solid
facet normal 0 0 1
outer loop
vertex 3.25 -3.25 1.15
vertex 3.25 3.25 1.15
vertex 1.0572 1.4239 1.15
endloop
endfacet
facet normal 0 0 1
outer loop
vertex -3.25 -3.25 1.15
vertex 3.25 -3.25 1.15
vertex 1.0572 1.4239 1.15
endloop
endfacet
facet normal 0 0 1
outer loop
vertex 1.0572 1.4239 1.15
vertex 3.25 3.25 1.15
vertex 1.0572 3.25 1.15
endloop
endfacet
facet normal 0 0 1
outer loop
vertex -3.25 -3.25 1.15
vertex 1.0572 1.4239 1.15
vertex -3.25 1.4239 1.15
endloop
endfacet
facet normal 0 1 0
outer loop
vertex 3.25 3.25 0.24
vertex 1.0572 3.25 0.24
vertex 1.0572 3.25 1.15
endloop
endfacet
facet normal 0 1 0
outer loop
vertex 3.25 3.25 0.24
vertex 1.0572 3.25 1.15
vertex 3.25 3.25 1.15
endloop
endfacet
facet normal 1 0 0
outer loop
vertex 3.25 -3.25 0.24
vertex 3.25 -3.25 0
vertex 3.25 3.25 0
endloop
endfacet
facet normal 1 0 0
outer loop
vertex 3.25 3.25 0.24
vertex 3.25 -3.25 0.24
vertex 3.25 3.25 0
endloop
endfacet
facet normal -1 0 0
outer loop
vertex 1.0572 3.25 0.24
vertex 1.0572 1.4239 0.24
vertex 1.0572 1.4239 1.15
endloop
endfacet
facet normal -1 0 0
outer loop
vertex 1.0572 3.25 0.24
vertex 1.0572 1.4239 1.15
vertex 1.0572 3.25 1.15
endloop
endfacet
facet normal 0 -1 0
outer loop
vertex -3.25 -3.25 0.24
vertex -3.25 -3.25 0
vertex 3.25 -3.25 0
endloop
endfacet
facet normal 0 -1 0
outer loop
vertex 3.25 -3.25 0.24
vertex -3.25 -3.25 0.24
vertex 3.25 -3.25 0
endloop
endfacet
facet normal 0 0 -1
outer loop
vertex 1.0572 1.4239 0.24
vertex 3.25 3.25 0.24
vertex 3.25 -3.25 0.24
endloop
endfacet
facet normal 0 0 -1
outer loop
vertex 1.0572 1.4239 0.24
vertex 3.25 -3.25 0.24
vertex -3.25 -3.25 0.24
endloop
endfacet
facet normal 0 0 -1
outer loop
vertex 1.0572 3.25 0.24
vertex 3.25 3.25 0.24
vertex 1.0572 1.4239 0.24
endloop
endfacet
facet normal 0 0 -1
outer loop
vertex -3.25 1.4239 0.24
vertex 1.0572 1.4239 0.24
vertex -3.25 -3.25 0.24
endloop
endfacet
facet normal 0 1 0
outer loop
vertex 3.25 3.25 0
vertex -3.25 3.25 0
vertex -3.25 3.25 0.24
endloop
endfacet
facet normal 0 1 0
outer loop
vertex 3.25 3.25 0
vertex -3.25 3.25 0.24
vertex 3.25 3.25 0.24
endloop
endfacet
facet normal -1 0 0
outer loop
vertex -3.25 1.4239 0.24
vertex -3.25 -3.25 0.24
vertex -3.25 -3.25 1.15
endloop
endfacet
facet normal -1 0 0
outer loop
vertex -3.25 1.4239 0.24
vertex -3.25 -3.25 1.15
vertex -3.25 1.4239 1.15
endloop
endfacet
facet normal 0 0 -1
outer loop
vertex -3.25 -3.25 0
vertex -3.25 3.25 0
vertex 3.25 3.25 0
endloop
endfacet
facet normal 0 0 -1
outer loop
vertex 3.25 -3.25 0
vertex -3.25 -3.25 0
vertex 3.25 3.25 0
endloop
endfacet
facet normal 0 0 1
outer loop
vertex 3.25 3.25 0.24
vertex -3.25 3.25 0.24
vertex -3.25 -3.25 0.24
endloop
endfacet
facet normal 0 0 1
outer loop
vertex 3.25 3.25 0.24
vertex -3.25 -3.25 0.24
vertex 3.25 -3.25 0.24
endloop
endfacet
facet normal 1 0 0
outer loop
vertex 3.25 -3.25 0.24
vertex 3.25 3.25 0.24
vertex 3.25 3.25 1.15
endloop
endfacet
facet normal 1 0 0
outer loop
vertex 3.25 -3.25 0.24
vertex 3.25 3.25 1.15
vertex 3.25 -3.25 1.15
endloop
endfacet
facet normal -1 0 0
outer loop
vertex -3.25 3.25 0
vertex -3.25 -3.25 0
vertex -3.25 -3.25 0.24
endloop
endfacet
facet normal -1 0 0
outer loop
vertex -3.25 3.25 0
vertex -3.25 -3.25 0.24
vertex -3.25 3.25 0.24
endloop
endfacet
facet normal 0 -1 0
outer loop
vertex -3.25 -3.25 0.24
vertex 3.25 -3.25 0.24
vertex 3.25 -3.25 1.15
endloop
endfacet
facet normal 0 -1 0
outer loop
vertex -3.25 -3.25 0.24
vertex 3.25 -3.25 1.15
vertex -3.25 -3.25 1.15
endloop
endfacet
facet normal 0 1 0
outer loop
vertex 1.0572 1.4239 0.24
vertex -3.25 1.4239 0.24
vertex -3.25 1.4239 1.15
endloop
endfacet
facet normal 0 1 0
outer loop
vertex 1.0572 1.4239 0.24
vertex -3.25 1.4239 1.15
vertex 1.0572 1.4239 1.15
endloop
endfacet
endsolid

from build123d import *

# Parameters (mm, degrees)
SKETCH_W      = 6.5
SKETCH_H      = 6.5
PAD_DEPTH     = 0.24
EXTRUDE_DEPTH = 0.91


with BuildPart() as pad:
    # Sketch → Pad (new body)
    with BuildSketch(Plane.XY):
        Rectangle(SKETCH_W, SKETCH_H)
    extrude(amount=PAD_DEPTH)


with BuildPart() as can:
    # Sketch001 (on Face6 of Pad) → Extrude (new body)
    with BuildSketch(Plane.XY.offset(0.24)):
        Polygon((-3.25, -3.25), (-3.25, 1.423879), (1.057164, 1.423879), (1.057164, 3.25), (3.25, 3.25), (3.25, -3.25), align=None)
    extrude(amount=EXTRUDE_DEPTH)


solid = Compound([pad.part, can.part])
